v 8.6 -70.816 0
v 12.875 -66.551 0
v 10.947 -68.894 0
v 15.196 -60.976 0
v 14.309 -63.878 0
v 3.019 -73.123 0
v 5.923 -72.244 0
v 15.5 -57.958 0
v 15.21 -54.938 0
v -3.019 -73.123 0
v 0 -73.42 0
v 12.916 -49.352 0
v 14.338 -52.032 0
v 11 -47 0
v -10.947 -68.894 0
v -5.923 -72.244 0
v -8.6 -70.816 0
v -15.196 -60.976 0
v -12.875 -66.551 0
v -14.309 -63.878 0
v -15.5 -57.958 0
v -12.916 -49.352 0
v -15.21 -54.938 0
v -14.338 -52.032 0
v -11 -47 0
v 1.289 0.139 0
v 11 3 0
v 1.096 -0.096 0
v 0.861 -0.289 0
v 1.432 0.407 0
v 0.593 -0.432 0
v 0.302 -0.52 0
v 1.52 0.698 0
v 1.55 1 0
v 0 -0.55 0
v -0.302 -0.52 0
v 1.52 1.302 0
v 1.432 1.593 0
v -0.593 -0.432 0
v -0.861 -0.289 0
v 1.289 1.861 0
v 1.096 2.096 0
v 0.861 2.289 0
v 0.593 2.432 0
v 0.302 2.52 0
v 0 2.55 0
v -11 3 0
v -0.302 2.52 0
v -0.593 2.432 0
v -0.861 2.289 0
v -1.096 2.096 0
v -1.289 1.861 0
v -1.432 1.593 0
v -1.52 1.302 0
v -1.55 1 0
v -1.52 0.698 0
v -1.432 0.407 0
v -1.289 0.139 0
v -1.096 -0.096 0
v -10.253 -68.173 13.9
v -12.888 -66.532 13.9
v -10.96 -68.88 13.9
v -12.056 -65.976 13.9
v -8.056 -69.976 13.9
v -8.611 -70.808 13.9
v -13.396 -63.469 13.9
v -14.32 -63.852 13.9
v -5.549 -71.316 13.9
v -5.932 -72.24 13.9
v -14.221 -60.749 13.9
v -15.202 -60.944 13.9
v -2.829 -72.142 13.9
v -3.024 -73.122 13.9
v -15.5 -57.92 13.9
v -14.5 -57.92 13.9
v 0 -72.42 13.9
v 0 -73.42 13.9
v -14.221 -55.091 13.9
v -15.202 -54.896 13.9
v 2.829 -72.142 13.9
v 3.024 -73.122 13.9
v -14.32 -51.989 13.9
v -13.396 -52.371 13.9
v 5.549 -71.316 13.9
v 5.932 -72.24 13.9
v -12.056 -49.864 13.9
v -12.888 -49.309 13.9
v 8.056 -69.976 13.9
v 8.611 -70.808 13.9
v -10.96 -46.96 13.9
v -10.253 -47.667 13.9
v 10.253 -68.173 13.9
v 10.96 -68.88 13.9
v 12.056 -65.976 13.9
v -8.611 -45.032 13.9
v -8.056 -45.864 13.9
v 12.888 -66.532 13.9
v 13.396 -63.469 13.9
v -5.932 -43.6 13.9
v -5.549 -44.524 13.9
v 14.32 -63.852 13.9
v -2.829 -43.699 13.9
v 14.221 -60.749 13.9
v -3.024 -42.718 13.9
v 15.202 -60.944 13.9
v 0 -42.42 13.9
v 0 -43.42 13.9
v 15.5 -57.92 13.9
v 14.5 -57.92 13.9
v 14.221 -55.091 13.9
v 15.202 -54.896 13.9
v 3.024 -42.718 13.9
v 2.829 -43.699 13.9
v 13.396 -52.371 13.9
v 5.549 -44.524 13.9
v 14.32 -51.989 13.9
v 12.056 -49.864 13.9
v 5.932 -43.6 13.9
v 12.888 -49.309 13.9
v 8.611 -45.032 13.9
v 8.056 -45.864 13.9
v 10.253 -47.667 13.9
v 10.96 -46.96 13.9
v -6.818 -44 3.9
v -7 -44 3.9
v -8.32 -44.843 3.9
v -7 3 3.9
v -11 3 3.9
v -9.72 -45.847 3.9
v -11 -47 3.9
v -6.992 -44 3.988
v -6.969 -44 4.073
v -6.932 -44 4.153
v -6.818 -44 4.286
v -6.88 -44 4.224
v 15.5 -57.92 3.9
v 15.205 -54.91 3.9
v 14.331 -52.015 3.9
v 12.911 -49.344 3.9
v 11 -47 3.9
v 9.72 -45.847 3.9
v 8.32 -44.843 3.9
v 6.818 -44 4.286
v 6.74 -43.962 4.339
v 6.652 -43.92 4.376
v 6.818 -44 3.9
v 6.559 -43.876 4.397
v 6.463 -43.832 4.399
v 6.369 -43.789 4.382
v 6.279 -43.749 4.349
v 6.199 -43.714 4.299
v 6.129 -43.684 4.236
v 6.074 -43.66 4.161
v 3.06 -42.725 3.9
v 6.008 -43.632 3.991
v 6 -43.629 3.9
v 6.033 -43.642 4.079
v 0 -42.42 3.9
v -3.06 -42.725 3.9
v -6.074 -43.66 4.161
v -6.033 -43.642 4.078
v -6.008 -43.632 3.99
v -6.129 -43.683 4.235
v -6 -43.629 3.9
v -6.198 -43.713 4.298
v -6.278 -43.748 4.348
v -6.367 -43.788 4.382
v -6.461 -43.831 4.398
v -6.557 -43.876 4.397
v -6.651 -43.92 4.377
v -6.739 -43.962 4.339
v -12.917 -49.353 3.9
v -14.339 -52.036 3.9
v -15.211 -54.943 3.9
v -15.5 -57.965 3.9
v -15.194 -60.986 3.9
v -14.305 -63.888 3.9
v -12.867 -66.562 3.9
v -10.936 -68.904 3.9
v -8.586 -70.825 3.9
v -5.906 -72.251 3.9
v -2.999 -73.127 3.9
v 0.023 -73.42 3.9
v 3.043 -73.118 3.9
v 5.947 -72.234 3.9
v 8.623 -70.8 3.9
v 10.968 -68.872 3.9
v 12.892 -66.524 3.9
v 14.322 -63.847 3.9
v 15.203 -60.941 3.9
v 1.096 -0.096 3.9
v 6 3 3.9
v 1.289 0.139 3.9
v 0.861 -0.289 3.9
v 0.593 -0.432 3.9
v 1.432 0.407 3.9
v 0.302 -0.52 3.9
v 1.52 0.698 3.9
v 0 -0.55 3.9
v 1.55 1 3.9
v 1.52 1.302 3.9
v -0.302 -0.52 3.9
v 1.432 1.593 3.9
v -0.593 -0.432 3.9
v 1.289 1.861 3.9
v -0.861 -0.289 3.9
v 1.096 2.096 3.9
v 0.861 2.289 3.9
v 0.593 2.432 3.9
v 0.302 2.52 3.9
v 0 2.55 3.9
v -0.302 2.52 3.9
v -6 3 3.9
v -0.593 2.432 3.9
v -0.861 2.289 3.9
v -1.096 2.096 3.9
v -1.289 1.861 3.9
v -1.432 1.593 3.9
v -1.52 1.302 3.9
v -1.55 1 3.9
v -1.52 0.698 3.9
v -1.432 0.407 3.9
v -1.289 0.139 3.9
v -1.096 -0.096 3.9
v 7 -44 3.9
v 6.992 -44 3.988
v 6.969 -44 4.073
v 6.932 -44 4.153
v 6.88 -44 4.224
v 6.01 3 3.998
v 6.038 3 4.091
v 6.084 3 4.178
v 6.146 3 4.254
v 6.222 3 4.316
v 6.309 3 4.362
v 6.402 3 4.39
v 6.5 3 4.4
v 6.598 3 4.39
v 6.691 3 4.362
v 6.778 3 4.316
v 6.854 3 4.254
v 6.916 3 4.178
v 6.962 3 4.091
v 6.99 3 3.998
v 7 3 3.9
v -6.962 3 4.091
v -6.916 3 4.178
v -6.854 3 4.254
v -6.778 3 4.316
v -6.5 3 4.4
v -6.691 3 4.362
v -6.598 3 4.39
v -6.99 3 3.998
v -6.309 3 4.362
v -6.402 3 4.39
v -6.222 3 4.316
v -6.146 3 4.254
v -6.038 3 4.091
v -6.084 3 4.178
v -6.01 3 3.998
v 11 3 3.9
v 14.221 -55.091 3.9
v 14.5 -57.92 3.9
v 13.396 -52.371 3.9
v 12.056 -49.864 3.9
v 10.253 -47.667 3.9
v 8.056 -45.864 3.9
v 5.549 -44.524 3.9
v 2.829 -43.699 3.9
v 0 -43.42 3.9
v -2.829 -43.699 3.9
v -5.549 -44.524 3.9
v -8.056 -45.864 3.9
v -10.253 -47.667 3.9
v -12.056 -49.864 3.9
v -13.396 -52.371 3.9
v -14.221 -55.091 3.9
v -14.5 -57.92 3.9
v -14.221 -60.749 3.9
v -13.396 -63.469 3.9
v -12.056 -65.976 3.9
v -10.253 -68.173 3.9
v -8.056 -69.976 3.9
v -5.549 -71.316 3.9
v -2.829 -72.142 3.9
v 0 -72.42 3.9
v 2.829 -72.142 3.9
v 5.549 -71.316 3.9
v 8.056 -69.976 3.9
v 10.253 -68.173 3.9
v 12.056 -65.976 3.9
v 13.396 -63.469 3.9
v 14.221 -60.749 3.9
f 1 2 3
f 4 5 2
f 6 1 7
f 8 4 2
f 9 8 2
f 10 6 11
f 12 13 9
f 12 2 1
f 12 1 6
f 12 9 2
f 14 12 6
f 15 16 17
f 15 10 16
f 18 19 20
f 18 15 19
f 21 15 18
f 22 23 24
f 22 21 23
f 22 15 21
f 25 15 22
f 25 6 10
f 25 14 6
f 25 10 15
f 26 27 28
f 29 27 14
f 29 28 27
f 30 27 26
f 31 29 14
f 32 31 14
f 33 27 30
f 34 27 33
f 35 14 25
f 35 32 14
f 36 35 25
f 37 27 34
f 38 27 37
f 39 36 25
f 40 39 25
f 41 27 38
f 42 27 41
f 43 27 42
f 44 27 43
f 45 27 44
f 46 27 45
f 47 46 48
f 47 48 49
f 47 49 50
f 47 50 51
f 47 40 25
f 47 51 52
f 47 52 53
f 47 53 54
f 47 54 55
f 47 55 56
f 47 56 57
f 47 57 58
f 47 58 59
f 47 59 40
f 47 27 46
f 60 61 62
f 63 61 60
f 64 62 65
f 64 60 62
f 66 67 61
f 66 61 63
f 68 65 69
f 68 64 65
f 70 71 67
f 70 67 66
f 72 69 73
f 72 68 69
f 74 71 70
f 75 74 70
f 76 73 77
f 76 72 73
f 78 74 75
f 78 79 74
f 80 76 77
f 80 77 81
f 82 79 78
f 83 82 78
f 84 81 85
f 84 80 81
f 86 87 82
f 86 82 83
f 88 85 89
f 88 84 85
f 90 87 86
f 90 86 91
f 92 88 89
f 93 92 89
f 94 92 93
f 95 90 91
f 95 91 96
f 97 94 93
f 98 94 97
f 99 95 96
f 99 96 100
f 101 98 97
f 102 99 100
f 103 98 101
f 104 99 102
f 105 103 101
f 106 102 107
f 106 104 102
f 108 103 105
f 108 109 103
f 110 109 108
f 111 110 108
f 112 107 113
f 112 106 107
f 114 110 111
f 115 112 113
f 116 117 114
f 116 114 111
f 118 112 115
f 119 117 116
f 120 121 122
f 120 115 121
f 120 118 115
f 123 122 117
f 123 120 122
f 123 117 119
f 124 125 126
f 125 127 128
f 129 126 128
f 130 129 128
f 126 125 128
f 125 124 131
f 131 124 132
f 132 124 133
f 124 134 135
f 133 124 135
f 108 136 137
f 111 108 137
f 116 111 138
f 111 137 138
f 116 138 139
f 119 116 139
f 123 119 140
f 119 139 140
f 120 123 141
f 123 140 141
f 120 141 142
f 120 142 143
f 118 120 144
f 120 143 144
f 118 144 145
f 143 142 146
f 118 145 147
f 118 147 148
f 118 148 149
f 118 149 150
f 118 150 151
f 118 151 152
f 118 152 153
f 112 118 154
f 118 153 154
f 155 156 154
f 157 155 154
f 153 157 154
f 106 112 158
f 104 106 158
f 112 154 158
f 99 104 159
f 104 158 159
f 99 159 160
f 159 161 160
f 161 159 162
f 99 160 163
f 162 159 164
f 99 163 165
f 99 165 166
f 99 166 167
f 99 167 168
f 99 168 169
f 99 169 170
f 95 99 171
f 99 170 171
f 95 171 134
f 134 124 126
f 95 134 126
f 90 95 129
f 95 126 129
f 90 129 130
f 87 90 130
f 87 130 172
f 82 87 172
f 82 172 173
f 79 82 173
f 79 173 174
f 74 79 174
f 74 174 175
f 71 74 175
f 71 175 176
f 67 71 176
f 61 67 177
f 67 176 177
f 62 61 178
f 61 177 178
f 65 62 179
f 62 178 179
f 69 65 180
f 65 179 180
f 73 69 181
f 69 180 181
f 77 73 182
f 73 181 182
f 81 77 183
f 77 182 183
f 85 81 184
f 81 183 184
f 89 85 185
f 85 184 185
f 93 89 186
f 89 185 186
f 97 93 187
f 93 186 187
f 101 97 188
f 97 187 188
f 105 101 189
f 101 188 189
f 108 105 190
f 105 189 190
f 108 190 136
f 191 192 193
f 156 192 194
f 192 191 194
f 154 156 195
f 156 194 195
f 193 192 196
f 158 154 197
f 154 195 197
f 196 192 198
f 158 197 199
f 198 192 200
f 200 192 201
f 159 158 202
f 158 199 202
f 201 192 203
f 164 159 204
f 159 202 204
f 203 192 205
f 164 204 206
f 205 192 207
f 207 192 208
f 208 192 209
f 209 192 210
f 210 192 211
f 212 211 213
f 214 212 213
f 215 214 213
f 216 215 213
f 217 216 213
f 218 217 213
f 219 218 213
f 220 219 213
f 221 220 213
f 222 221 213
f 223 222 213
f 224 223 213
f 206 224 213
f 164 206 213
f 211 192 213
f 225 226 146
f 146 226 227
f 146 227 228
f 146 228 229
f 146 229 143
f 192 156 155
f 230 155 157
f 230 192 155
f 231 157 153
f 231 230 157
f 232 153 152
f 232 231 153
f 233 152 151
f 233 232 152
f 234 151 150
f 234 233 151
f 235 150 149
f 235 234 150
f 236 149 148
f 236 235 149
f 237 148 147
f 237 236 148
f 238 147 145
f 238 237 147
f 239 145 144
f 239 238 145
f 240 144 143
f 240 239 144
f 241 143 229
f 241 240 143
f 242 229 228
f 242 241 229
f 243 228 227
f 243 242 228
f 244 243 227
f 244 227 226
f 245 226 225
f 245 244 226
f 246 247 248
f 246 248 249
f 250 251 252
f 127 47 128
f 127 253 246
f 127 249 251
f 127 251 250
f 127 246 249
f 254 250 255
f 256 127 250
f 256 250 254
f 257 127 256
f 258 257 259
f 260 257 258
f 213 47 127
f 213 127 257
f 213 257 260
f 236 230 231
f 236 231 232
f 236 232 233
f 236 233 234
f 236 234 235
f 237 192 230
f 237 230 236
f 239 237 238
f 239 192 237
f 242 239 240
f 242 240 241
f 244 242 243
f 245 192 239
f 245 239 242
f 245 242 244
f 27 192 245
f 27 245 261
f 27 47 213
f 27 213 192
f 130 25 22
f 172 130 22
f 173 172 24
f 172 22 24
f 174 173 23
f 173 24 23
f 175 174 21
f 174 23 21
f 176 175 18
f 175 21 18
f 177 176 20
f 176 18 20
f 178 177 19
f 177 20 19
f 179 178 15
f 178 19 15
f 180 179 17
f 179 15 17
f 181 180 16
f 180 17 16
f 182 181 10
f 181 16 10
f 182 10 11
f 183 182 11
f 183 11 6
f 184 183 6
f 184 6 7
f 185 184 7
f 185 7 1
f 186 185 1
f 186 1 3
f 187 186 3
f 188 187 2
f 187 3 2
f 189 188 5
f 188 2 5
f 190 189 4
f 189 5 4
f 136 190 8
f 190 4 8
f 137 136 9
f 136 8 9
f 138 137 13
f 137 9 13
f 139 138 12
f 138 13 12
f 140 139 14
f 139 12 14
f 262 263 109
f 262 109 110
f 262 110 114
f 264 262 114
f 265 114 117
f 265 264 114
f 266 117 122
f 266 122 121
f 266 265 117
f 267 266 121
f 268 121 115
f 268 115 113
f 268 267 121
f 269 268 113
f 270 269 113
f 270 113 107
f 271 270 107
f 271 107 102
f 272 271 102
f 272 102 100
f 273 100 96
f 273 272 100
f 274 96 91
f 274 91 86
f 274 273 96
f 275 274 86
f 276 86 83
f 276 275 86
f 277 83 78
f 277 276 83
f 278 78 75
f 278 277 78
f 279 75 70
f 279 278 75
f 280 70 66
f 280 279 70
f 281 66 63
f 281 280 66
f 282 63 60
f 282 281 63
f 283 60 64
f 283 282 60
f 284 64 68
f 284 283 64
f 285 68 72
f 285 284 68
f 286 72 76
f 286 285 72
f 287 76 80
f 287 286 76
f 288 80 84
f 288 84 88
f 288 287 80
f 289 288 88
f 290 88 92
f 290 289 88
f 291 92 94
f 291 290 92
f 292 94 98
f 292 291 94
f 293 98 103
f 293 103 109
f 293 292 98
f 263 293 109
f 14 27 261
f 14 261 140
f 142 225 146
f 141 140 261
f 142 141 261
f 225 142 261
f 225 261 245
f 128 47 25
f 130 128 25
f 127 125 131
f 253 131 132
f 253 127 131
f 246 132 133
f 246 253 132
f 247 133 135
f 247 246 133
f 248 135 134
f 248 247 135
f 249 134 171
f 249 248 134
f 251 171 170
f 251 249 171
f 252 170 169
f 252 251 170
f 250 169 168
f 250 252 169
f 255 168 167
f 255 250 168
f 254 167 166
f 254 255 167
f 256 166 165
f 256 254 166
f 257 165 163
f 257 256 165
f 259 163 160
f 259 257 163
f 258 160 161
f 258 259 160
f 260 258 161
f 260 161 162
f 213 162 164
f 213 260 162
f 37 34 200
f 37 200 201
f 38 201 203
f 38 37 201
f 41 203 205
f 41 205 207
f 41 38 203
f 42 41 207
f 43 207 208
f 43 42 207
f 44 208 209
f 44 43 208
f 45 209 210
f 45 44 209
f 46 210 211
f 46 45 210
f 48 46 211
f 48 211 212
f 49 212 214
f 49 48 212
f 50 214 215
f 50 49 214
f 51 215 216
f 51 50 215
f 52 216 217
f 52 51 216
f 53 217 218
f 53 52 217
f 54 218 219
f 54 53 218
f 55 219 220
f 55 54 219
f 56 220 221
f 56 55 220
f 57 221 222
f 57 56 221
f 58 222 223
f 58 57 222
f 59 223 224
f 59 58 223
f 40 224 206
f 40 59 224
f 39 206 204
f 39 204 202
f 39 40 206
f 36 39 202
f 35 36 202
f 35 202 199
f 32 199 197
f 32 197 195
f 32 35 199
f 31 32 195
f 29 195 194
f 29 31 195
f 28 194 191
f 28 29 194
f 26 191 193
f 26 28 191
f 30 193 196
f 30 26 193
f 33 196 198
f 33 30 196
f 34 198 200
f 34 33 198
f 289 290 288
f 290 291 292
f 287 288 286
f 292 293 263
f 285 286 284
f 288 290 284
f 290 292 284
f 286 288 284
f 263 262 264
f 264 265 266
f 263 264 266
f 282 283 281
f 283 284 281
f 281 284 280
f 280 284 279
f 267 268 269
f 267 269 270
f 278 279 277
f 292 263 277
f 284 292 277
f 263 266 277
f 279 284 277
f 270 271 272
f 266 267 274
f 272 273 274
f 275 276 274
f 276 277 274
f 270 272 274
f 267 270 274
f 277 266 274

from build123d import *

# Parameters (mm, degrees)
SKETCH_R      = 1.55
PAD_DEPTH     = 3.9
PAD002_DEPTH  = 47
SKETCH001_R   = 15.5
SKETCH001_R_2 = 14.5
PAD003_DEPTH  = 10


with BuildPart() as part:
    # Sketch → Pad (new body)
    with BuildSketch(Plane.XY):
        with BuildLine():
            Line((-11, 3), (11, 3))
            Line((11, 3), (11, -47))
            ThreePointArc((-11, -47), (0, -73.420165), (11, -47))
            Line((-11, 3), (-11, -47))
        make_face()
        with Locations((0, 1)):
            Circle(SKETCH_R, mode=Mode.SUBTRACT)
    extrude(amount=PAD_DEPTH)

    # Sketch003 (on Face1 of Pad) → Pad002 (join)
    with BuildSketch(Plane(origin=(0, 3, 0), x_dir=(-1, 0, 0), z_dir=(0, 1, 0))):
        with BuildLine():
            ThreePointArc((-6, 3.9), (-6.5, 4.4), (-7, 3.9))
            Line((-7, 3.9), (-6, 3.9))
        make_face()
        with BuildLine():
            ThreePointArc((7, 3.9), (6.5, 4.4), (6, 3.9))
            Line((6, 3.9), (7, 3.9))
        make_face()
    extrude(amount=-PAD002_DEPTH)

    # Sketch001 (on Face5 of Pad002) → Pad003 (join)
    with BuildSketch(Plane.XY.offset(3.9)):
        with Locations((0, -57.920165)):
            Circle(SKETCH001_R)
        with Locations((0, -57.920165)):
            Circle(SKETCH001_R_2, mode=Mode.SUBTRACT)
    extrude(amount=PAD003_DEPTH)


solid = part.part
